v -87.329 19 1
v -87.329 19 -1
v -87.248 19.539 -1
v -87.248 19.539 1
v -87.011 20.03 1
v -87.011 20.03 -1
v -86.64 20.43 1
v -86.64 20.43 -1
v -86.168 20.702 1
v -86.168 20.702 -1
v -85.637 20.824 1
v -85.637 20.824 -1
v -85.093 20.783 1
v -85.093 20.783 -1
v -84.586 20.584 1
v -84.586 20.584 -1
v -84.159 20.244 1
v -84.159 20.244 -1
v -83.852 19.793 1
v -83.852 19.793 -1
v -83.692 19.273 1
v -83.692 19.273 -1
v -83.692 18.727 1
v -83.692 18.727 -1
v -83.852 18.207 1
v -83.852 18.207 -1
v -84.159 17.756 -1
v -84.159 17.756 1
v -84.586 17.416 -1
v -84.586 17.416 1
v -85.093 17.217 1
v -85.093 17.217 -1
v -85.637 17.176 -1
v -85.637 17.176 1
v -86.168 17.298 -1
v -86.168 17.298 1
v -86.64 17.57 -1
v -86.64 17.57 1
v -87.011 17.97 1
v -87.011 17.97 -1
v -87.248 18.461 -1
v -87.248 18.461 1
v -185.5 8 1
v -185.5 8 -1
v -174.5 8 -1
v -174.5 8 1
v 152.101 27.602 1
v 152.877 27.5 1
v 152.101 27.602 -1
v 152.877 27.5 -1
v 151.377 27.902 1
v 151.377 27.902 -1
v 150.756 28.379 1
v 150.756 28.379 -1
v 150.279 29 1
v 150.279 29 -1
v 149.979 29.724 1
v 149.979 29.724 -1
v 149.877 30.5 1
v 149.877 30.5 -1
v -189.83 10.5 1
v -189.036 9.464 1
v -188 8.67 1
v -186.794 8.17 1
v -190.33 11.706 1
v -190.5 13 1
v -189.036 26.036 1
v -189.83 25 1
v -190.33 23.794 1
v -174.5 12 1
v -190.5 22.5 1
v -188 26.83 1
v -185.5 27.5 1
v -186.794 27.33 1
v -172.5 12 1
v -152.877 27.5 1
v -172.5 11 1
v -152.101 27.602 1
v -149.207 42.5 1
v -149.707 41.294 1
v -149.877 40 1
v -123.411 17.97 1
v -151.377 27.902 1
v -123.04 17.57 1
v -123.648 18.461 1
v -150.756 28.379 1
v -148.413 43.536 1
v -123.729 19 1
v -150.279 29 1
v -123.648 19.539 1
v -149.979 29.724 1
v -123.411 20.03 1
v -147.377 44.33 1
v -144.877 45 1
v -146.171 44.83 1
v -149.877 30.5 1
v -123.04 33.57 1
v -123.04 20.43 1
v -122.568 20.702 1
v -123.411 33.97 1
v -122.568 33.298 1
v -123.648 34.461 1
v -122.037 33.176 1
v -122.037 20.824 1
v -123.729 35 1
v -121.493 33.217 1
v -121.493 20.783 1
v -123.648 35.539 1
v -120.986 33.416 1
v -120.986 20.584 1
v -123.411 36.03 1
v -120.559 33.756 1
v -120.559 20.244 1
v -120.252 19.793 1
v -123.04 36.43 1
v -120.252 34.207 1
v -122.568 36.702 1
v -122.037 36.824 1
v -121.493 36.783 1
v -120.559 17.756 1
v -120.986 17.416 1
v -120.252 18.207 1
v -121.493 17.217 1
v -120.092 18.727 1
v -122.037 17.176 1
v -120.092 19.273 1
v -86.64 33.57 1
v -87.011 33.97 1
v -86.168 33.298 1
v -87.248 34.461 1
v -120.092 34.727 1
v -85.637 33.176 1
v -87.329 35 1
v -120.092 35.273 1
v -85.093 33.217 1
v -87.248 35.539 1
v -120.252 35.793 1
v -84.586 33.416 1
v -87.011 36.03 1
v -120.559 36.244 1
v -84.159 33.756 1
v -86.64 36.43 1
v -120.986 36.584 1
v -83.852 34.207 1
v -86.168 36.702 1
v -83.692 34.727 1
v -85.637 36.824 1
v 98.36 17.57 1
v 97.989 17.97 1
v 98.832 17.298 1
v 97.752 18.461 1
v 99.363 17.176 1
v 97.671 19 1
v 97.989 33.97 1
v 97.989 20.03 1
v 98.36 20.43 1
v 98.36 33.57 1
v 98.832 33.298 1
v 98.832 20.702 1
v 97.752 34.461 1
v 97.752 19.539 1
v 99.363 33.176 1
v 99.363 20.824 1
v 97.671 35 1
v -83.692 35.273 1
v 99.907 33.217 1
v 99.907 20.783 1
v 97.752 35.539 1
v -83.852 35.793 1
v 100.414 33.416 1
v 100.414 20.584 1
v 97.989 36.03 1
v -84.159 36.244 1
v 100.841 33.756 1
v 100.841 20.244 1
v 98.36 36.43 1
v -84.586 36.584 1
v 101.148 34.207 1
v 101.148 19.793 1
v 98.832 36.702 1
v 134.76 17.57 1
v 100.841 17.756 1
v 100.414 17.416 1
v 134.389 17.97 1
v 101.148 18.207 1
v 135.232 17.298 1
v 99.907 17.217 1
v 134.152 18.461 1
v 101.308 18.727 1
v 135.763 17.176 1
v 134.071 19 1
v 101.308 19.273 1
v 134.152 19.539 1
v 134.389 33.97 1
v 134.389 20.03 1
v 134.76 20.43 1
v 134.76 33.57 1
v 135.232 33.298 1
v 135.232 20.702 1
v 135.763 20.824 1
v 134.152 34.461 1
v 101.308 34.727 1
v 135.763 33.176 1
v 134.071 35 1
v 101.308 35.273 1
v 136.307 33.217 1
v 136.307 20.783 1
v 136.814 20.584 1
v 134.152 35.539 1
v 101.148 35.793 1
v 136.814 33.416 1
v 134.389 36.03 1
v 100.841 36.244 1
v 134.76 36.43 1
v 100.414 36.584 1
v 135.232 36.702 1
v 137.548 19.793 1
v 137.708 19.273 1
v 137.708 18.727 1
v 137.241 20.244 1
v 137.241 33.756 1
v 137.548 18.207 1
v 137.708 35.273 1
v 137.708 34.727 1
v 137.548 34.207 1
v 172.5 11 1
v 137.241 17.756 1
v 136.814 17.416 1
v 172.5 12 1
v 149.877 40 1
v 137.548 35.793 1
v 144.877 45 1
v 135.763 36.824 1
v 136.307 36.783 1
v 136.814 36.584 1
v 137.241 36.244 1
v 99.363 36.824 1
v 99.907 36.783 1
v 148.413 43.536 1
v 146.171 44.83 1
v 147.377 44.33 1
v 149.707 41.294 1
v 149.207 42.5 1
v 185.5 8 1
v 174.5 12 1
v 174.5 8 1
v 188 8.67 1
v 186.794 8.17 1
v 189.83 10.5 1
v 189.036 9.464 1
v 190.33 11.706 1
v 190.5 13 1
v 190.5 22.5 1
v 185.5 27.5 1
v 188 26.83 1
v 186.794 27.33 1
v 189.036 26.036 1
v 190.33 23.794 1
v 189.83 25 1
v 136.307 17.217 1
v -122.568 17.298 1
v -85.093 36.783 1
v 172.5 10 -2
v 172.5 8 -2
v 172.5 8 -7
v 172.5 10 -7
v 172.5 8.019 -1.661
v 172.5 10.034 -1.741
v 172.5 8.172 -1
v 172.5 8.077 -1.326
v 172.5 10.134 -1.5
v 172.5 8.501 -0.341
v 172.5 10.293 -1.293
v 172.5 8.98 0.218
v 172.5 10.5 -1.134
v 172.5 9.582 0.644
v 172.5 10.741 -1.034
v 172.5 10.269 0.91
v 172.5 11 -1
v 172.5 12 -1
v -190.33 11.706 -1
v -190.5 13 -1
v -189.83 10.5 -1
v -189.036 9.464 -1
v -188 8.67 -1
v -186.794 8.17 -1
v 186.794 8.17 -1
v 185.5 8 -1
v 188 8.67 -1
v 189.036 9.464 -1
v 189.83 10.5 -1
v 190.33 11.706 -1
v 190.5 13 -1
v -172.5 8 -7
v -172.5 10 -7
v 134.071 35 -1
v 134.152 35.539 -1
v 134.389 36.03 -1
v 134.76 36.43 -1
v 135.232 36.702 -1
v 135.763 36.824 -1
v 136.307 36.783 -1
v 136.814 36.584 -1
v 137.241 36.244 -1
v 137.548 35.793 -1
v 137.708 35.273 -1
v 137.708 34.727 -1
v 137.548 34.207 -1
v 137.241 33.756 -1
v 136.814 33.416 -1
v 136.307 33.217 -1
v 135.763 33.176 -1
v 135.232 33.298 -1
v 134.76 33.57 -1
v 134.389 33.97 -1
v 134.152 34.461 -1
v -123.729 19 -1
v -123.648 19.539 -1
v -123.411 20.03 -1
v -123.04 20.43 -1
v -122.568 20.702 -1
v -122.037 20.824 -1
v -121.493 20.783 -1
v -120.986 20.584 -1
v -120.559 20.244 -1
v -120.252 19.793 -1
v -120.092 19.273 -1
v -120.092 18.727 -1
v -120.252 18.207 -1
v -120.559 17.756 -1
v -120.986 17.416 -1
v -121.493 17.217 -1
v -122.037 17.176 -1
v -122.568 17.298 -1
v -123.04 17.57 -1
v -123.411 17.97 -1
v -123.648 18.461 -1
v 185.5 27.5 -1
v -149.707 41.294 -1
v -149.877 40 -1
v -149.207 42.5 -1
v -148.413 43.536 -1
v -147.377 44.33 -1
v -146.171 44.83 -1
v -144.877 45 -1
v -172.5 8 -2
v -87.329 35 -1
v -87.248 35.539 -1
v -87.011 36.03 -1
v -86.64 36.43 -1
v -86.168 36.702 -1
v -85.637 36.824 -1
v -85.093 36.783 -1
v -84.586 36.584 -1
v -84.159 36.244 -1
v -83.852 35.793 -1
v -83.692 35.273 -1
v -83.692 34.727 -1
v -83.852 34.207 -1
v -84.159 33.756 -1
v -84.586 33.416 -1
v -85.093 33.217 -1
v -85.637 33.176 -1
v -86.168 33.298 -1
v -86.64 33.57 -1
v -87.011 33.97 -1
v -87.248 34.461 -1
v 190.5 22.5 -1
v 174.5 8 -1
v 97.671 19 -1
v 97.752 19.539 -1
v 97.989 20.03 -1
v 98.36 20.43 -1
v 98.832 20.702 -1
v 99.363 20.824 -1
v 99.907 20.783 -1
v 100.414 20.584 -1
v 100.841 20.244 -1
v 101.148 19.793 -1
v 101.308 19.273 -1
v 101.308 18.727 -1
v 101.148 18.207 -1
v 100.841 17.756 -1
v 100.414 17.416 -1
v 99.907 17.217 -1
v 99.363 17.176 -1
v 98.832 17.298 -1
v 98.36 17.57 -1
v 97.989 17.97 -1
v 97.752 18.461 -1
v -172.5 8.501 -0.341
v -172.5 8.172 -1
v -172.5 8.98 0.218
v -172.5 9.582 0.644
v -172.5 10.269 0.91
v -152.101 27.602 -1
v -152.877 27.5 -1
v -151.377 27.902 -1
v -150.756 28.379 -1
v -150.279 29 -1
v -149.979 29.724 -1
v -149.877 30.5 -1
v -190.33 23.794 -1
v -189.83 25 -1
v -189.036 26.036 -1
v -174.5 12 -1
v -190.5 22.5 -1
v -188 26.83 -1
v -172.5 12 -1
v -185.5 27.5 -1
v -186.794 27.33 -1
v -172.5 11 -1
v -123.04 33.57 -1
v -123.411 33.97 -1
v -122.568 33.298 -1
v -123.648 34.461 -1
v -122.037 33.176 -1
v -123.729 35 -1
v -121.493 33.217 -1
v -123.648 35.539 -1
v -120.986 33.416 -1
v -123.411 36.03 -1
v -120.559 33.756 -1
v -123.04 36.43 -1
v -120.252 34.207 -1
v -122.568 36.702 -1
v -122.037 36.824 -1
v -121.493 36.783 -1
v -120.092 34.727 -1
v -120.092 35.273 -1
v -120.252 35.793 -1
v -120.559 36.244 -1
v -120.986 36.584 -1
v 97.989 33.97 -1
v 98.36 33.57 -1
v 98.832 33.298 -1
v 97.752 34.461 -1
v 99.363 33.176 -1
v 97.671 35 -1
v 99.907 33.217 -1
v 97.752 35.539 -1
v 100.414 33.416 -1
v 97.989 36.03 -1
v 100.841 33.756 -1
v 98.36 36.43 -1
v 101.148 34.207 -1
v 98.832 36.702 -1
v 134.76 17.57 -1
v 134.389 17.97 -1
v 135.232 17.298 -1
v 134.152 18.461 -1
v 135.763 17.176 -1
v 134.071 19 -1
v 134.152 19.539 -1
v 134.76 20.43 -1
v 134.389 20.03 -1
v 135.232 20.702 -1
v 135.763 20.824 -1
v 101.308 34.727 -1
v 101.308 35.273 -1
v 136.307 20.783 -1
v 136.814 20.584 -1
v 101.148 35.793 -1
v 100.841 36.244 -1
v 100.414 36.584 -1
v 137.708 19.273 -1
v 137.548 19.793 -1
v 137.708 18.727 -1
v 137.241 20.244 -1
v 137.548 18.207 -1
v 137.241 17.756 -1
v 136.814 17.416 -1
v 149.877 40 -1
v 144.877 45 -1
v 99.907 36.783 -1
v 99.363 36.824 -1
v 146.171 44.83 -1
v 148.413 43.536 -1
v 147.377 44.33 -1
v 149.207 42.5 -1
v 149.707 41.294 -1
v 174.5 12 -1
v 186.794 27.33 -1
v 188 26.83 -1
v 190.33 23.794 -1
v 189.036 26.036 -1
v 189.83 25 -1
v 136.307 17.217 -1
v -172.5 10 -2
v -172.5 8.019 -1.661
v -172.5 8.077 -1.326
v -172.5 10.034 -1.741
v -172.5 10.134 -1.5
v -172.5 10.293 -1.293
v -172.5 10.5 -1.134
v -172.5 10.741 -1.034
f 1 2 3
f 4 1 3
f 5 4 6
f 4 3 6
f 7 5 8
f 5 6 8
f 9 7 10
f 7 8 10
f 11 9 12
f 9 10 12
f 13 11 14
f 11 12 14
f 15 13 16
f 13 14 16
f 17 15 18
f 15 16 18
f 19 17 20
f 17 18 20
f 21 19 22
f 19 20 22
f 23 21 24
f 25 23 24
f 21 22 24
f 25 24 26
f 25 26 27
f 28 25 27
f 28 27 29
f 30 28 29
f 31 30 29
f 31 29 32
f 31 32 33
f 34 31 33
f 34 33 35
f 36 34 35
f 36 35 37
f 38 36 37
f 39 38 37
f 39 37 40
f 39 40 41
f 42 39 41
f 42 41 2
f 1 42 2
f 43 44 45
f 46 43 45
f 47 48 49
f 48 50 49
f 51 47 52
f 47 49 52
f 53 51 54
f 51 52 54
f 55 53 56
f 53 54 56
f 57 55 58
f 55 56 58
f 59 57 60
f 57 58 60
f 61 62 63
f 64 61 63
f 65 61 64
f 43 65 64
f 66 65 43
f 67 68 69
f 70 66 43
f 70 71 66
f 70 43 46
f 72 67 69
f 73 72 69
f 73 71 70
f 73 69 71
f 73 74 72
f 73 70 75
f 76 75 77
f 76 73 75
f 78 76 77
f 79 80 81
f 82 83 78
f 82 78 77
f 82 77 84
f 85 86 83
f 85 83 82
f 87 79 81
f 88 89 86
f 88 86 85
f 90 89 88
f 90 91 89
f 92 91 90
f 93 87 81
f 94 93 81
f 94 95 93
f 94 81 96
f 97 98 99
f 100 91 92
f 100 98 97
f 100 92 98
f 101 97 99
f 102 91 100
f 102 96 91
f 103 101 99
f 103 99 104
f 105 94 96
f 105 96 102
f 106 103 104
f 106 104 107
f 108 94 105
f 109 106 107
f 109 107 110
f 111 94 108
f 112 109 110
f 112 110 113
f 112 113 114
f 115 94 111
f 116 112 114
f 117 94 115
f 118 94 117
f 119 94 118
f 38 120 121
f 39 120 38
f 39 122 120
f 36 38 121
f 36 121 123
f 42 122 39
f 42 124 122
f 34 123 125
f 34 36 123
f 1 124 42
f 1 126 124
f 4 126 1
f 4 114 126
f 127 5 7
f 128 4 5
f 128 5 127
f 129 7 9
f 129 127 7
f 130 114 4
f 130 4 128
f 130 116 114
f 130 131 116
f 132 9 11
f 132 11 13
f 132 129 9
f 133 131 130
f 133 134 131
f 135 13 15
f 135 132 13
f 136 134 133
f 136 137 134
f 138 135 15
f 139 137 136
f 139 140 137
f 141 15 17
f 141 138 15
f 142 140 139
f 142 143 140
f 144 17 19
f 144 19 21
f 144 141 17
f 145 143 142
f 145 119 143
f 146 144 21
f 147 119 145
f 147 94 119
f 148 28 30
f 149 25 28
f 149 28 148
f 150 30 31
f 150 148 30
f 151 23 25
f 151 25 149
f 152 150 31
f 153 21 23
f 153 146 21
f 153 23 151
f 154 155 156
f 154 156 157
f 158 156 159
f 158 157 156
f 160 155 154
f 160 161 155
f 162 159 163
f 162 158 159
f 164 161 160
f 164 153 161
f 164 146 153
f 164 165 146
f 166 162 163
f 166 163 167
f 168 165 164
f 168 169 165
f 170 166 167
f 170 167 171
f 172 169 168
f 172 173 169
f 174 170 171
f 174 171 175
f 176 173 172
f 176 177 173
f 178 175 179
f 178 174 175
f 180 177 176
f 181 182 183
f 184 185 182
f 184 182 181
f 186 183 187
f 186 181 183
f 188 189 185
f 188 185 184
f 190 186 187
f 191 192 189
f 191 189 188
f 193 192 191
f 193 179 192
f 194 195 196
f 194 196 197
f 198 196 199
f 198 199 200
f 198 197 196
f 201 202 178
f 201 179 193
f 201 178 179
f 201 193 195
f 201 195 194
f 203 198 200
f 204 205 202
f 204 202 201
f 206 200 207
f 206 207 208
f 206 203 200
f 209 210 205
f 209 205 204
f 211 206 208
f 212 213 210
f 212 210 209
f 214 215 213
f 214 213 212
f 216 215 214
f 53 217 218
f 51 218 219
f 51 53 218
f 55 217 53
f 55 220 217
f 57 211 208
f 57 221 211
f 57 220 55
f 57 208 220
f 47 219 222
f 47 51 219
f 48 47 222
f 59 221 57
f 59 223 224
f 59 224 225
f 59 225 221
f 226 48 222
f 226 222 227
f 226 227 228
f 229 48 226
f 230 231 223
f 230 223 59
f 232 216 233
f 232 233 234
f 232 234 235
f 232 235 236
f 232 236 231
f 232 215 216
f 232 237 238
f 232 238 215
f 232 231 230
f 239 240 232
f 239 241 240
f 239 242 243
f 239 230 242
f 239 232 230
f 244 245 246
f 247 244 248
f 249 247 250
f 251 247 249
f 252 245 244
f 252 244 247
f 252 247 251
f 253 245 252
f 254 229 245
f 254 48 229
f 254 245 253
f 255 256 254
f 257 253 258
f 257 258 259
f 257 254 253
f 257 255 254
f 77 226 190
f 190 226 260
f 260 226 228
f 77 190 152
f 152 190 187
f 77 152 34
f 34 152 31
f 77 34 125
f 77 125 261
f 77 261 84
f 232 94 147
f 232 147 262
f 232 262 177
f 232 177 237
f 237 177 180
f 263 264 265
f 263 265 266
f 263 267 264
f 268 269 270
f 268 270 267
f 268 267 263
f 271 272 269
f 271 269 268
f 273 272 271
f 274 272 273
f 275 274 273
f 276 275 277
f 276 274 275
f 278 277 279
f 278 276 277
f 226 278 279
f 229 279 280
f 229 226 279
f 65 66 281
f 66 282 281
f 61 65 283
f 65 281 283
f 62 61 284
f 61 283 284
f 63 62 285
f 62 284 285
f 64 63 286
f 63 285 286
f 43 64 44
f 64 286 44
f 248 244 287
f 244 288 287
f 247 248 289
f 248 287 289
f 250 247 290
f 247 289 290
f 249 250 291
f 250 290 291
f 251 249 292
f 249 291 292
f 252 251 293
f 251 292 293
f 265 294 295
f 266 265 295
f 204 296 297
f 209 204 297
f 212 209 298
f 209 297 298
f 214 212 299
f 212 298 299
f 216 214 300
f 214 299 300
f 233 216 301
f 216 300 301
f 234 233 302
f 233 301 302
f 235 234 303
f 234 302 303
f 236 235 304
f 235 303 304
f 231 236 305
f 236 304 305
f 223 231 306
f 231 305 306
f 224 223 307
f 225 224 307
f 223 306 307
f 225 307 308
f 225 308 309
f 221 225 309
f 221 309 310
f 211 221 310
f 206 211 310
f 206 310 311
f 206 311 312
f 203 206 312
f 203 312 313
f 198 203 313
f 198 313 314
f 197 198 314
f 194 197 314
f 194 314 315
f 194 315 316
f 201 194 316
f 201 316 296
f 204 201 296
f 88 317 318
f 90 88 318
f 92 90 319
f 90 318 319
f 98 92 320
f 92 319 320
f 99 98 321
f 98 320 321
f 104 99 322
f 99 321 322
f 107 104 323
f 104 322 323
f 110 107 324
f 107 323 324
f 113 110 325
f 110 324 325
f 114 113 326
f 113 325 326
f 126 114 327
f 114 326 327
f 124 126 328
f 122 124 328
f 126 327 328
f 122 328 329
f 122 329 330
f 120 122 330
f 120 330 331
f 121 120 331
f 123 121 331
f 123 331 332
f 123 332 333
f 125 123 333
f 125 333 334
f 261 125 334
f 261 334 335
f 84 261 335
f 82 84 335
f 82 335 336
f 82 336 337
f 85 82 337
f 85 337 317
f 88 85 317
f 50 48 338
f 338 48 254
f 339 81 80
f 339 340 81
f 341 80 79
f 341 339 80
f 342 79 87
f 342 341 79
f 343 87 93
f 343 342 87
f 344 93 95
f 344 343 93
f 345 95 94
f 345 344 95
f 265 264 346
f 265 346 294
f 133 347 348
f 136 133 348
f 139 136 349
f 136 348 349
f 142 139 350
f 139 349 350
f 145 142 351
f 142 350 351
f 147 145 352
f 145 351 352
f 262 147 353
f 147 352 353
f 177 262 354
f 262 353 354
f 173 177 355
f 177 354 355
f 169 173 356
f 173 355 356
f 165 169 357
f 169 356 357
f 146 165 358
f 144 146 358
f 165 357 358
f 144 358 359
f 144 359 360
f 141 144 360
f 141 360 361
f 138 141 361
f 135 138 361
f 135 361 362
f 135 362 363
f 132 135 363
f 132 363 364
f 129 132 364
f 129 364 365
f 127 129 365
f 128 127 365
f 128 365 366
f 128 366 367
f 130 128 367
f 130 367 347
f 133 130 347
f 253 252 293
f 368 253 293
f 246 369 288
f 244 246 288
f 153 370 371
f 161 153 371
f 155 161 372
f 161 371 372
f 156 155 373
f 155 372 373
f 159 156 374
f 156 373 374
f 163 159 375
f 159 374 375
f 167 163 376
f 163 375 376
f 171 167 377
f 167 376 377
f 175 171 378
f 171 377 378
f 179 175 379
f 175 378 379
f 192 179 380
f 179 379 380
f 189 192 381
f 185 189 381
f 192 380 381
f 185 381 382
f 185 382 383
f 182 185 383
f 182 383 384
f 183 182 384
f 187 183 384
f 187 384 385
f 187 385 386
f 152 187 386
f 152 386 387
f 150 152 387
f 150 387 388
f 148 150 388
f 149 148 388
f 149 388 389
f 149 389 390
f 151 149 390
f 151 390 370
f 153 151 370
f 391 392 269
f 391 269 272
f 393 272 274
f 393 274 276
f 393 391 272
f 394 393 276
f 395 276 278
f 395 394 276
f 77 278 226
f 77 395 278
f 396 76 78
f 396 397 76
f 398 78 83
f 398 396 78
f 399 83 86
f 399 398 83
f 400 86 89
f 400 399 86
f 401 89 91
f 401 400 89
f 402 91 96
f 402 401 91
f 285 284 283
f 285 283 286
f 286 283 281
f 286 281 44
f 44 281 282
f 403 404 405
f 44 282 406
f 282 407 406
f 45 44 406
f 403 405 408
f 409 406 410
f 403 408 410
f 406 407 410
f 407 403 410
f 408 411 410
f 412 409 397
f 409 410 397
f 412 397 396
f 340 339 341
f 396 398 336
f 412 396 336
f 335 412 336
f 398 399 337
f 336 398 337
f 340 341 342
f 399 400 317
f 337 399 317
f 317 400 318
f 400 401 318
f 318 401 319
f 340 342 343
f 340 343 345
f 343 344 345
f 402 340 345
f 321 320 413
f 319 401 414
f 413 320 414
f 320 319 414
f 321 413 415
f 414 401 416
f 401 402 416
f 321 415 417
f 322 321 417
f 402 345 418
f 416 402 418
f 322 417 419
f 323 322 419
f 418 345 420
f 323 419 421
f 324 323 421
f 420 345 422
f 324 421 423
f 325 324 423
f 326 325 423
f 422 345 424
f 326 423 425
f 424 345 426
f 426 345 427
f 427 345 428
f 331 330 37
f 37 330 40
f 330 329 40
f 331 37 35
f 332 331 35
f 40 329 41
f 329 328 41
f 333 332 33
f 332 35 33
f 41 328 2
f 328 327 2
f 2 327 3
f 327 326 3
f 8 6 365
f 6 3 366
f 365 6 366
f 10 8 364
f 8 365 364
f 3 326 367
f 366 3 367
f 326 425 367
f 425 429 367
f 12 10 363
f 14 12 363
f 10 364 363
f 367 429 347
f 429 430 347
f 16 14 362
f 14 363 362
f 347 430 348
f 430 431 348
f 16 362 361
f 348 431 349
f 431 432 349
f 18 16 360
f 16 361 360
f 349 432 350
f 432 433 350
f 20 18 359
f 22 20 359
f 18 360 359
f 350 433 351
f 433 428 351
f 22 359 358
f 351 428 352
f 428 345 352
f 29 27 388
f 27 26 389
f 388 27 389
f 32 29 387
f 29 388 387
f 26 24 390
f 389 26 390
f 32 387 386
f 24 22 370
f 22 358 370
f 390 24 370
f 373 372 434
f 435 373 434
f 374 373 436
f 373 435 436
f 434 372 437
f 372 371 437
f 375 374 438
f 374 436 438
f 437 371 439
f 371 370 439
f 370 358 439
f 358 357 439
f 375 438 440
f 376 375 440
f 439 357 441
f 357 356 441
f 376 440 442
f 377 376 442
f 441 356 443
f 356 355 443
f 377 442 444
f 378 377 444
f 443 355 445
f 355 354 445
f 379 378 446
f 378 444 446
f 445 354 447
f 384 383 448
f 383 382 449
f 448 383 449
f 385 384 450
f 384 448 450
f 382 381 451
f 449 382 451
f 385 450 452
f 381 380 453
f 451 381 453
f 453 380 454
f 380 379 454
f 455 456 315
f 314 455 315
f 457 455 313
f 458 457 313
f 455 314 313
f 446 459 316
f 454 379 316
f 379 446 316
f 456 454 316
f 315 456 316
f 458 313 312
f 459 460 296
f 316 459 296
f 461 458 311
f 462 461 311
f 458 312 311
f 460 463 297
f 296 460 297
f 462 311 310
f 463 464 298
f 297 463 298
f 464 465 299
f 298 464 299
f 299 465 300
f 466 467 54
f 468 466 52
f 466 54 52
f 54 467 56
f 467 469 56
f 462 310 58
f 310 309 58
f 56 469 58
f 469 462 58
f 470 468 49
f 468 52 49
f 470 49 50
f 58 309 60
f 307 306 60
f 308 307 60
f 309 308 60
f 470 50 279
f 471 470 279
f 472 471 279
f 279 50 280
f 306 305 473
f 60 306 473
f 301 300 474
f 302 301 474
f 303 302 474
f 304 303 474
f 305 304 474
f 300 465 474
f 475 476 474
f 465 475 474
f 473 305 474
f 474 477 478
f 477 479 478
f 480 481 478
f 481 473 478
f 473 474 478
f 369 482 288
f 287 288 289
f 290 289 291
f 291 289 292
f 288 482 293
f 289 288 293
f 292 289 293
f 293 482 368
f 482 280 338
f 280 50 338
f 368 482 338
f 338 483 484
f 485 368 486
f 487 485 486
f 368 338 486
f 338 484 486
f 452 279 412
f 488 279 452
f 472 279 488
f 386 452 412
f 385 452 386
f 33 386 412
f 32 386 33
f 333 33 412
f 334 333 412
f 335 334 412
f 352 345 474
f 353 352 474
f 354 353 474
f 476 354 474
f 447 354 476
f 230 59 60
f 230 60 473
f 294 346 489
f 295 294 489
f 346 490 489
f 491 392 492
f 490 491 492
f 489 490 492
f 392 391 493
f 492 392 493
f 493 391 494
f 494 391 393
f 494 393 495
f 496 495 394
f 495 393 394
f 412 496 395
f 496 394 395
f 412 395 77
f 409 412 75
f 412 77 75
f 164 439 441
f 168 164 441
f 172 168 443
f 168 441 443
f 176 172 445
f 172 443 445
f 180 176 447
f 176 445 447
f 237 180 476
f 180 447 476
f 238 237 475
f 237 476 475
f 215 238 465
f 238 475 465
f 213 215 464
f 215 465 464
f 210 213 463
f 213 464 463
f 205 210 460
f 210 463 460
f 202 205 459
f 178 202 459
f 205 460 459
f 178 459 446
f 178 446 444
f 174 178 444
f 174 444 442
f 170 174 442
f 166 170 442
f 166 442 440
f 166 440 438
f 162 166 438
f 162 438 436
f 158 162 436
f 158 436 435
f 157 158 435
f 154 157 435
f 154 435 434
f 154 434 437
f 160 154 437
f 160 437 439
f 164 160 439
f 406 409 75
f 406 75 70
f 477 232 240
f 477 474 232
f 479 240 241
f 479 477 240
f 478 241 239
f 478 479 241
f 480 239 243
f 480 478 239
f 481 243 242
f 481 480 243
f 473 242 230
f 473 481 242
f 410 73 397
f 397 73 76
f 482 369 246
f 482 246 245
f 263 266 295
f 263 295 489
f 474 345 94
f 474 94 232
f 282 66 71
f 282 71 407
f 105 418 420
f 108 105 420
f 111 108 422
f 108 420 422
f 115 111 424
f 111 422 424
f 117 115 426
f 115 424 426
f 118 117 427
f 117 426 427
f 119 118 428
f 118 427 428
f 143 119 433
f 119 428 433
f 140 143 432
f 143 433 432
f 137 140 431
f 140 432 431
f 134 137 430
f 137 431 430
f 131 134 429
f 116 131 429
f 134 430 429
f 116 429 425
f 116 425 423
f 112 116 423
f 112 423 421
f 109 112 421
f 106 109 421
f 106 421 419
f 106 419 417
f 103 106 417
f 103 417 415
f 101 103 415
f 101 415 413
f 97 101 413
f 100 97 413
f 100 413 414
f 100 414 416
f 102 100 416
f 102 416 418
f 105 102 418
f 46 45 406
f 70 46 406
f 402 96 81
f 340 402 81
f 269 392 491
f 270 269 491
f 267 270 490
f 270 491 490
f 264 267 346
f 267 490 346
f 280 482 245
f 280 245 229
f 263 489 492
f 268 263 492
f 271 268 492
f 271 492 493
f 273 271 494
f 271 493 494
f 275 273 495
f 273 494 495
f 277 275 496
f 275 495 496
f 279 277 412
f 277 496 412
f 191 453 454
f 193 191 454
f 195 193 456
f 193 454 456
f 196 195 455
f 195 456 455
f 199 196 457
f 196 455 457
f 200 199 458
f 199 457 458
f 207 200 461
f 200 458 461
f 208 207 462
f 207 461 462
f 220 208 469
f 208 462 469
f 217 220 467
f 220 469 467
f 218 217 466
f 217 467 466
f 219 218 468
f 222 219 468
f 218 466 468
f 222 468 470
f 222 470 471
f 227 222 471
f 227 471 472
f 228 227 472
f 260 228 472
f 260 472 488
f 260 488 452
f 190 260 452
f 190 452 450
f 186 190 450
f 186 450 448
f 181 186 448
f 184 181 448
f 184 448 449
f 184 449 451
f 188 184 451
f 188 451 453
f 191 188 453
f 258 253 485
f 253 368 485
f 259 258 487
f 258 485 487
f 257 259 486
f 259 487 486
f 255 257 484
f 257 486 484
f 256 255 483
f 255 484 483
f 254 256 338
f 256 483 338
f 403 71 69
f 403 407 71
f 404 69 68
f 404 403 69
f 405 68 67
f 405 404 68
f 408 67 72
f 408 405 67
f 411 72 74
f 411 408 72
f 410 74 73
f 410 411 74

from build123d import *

# Parameters (mm, degrees)
BOSS_EXTRUDE1_START        = 8
SKETCH2_W                  = 381
SKETCH2_H                  = 2
BOSS_EXTRUDE1_DEPTH        = 37
SKETCH3_W                  = 345
SKETCH3_H                  = 2
BOSS_EXTRUDE2_DEPTH        = 6
SKETCH4_W                  = 40.623
SKETCH4_H                  = 17.5
CUT_EXTRUDE1_DEPTH         = 3
F_6_CLEARANCE_HOLE1_D      = 3.6576
FILLET2_R                  = 5
FILLET3_R                  = 3
SKETCH8_W                  = 2
SKETCH8_H                  = 4
CUT_EXTRUDE2_DEPTH         = 196.834751768
FLATTEN_BENDS1_START       = -7
FLATTEN_BENDS1_OUTLINE_W   = 345
FLATTEN_BENDS1_OUTLINE_H   = 2
FLATTEN_BENDS1_DEPTH       = 6
FLATTEN_BENDS1_START_2     = -1
FLATTEN_BENDS1_2_OUTLINE_W = 345
FLATTEN_BENDS1_2_OUTLINE_H = 4.701769682
FLATTEN_BENDS1_2_DEPTH     = 2
PROCESS_BENDS1_START       = -172.5
PROCESS_BENDS1_DEPTH       = 345
PROCESS_BENDS1_2_DEPTH     = 345


# Read off the part's stored shape, not the designer's step: Flatten-Bends1, Process-Bends1
with BuildPart() as part:
    # Sketch2 → Boss-Extrude1 (new body)
    with BuildSketch(Plane(origin=(0, 0, 0), x_dir=(1, 0, 0), z_dir=(0, 1, 0)).offset(BOSS_EXTRUDE1_START)):
        Rectangle(SKETCH2_W, SKETCH2_H)
    extrude(amount=BOSS_EXTRUDE1_DEPTH)

    # Sketch3 → Boss-Extrude2 (add)
    with BuildSketch(Plane(origin=(0, 0, -1), x_dir=(-1, 0, 0), z_dir=(0, 0, -1))):
        with Locations((0, 9)):
            Rectangle(SKETCH3_W, SKETCH3_H)
    extrude(amount=BOSS_EXTRUDE2_DEPTH)

    # Sketch4 → Cut-Extrude1 (cut)
    with BuildSketch(Plane.XY.offset(1)):
        with Locations((170.1885, 36.25)):
            Rectangle(SKETCH4_W, SKETCH4_H)
        with Locations((-170.1885, 36.25)):
            Rectangle(SKETCH4_W, SKETCH4_H)
    extrude(amount=-CUT_EXTRUDE1_DEPTH, mode=Mode.SUBTRACT)

    # #6 Clearance Hole1 (through all)
    with Locations(Plane.XY.offset(1)):
        with Locations((-121.9, 35), (-121.9, 19), (-85.5, 35), (-85.5, 19), (99.5, 19), (99.5, 35), (135.9, 35), (135.9, 19)):
            Hole(F_6_CLEARANCE_HOLE1_D / 2)

    # Fillet2
    fillet2_edges = [part.edges().sort_by_distance(p)[0] for p in [
        (-190.5, 27.5, 0),
        (-149.877, 45, 0),
        (190.5, 27.5, 0),
        (149.877, 45, 0),
        (-190.5, 8, 0),
        (190.5, 8, 0),
    ]]
    fillet(fillet2_edges, radius=FILLET2_R)

    # Fillet3
    fillet3_edges = [part.edges().sort_by_distance(p)[0] for p in [
        (-149.877, 27.5, 0),
        (149.877, 27.5, 0),
    ]]
    fillet(fillet3_edges, radius=FILLET3_R)

    # Sketch8 → Cut-Extrude2 (cut, through all)
    with BuildSketch(Plane(origin=(0, 0, -1), x_dir=(-1, 0, 0), z_dir=(0, 0, -1))):
        with Locations((173.5, 10)):
            Rectangle(SKETCH8_W, SKETCH8_H)
        with Locations((-173.5, 10)):
            Rectangle(SKETCH8_W, SKETCH8_H)
    extrude(amount=-CUT_EXTRUDE2_DEPTH, mode=Mode.SUBTRACT)

    # Flatten-Bends1 outline → Flatten-Bends1 (cut)
    with BuildSketch(Plane.XY.offset(FLATTEN_BENDS1_START)):
        with Locations((0, 9)):
            Rectangle(FLATTEN_BENDS1_OUTLINE_W, FLATTEN_BENDS1_OUTLINE_H)
    extrude(amount=FLATTEN_BENDS1_DEPTH, mode=Mode.SUBTRACT)

    # Flatten-Bends1 2 outline → Flatten-Bends1 2 (add)
    with BuildSketch(Plane.XY.offset(FLATTEN_BENDS1_START_2)):
        with Locations((0, 5.649115159)):
            Rectangle(FLATTEN_BENDS1_2_OUTLINE_W, FLATTEN_BENDS1_2_OUTLINE_H)
    extrude(amount=FLATTEN_BENDS1_2_DEPTH)

    # Process-Bends1 outline → Process-Bends1 (cut)
    with BuildSketch(Plane.YZ.offset(PROCESS_BENDS1_START)):
        with BuildLine():
            Line((3.298230318, -1), (8.171572875, -1))
            ThreePointArc((8.171572875, -1), (9.267949192, 0.449489743), (11, 1))
            Line((11, 1), (3.298230318, 1))
            Line((3.298230318, 1), (3.298230318, -1))
        make_face()
    extrude(amount=PROCESS_BENDS1_DEPTH, mode=Mode.SUBTRACT)

    # Process-Bends1 2 outline → Process-Bends1 2 (add)
    with BuildSketch(Plane.YZ.offset(PROCESS_BENDS1_START)):
        with BuildLine():
            Line((8, -2), (8, -7))
            Line((8, -7), (10, -7))
            Line((10, -7), (10, -2))
            ThreePointArc((10, -2), (10.292893219, -1.292893219), (11, -1))
            Line((11, -1), (8.171572875, -1))
            ThreePointArc((8.171572875, -1), (8.043204321, -1.492694064), (8, -2))
        make_face()
    extrude(amount=PROCESS_BENDS1_2_DEPTH)


solid = part.part
